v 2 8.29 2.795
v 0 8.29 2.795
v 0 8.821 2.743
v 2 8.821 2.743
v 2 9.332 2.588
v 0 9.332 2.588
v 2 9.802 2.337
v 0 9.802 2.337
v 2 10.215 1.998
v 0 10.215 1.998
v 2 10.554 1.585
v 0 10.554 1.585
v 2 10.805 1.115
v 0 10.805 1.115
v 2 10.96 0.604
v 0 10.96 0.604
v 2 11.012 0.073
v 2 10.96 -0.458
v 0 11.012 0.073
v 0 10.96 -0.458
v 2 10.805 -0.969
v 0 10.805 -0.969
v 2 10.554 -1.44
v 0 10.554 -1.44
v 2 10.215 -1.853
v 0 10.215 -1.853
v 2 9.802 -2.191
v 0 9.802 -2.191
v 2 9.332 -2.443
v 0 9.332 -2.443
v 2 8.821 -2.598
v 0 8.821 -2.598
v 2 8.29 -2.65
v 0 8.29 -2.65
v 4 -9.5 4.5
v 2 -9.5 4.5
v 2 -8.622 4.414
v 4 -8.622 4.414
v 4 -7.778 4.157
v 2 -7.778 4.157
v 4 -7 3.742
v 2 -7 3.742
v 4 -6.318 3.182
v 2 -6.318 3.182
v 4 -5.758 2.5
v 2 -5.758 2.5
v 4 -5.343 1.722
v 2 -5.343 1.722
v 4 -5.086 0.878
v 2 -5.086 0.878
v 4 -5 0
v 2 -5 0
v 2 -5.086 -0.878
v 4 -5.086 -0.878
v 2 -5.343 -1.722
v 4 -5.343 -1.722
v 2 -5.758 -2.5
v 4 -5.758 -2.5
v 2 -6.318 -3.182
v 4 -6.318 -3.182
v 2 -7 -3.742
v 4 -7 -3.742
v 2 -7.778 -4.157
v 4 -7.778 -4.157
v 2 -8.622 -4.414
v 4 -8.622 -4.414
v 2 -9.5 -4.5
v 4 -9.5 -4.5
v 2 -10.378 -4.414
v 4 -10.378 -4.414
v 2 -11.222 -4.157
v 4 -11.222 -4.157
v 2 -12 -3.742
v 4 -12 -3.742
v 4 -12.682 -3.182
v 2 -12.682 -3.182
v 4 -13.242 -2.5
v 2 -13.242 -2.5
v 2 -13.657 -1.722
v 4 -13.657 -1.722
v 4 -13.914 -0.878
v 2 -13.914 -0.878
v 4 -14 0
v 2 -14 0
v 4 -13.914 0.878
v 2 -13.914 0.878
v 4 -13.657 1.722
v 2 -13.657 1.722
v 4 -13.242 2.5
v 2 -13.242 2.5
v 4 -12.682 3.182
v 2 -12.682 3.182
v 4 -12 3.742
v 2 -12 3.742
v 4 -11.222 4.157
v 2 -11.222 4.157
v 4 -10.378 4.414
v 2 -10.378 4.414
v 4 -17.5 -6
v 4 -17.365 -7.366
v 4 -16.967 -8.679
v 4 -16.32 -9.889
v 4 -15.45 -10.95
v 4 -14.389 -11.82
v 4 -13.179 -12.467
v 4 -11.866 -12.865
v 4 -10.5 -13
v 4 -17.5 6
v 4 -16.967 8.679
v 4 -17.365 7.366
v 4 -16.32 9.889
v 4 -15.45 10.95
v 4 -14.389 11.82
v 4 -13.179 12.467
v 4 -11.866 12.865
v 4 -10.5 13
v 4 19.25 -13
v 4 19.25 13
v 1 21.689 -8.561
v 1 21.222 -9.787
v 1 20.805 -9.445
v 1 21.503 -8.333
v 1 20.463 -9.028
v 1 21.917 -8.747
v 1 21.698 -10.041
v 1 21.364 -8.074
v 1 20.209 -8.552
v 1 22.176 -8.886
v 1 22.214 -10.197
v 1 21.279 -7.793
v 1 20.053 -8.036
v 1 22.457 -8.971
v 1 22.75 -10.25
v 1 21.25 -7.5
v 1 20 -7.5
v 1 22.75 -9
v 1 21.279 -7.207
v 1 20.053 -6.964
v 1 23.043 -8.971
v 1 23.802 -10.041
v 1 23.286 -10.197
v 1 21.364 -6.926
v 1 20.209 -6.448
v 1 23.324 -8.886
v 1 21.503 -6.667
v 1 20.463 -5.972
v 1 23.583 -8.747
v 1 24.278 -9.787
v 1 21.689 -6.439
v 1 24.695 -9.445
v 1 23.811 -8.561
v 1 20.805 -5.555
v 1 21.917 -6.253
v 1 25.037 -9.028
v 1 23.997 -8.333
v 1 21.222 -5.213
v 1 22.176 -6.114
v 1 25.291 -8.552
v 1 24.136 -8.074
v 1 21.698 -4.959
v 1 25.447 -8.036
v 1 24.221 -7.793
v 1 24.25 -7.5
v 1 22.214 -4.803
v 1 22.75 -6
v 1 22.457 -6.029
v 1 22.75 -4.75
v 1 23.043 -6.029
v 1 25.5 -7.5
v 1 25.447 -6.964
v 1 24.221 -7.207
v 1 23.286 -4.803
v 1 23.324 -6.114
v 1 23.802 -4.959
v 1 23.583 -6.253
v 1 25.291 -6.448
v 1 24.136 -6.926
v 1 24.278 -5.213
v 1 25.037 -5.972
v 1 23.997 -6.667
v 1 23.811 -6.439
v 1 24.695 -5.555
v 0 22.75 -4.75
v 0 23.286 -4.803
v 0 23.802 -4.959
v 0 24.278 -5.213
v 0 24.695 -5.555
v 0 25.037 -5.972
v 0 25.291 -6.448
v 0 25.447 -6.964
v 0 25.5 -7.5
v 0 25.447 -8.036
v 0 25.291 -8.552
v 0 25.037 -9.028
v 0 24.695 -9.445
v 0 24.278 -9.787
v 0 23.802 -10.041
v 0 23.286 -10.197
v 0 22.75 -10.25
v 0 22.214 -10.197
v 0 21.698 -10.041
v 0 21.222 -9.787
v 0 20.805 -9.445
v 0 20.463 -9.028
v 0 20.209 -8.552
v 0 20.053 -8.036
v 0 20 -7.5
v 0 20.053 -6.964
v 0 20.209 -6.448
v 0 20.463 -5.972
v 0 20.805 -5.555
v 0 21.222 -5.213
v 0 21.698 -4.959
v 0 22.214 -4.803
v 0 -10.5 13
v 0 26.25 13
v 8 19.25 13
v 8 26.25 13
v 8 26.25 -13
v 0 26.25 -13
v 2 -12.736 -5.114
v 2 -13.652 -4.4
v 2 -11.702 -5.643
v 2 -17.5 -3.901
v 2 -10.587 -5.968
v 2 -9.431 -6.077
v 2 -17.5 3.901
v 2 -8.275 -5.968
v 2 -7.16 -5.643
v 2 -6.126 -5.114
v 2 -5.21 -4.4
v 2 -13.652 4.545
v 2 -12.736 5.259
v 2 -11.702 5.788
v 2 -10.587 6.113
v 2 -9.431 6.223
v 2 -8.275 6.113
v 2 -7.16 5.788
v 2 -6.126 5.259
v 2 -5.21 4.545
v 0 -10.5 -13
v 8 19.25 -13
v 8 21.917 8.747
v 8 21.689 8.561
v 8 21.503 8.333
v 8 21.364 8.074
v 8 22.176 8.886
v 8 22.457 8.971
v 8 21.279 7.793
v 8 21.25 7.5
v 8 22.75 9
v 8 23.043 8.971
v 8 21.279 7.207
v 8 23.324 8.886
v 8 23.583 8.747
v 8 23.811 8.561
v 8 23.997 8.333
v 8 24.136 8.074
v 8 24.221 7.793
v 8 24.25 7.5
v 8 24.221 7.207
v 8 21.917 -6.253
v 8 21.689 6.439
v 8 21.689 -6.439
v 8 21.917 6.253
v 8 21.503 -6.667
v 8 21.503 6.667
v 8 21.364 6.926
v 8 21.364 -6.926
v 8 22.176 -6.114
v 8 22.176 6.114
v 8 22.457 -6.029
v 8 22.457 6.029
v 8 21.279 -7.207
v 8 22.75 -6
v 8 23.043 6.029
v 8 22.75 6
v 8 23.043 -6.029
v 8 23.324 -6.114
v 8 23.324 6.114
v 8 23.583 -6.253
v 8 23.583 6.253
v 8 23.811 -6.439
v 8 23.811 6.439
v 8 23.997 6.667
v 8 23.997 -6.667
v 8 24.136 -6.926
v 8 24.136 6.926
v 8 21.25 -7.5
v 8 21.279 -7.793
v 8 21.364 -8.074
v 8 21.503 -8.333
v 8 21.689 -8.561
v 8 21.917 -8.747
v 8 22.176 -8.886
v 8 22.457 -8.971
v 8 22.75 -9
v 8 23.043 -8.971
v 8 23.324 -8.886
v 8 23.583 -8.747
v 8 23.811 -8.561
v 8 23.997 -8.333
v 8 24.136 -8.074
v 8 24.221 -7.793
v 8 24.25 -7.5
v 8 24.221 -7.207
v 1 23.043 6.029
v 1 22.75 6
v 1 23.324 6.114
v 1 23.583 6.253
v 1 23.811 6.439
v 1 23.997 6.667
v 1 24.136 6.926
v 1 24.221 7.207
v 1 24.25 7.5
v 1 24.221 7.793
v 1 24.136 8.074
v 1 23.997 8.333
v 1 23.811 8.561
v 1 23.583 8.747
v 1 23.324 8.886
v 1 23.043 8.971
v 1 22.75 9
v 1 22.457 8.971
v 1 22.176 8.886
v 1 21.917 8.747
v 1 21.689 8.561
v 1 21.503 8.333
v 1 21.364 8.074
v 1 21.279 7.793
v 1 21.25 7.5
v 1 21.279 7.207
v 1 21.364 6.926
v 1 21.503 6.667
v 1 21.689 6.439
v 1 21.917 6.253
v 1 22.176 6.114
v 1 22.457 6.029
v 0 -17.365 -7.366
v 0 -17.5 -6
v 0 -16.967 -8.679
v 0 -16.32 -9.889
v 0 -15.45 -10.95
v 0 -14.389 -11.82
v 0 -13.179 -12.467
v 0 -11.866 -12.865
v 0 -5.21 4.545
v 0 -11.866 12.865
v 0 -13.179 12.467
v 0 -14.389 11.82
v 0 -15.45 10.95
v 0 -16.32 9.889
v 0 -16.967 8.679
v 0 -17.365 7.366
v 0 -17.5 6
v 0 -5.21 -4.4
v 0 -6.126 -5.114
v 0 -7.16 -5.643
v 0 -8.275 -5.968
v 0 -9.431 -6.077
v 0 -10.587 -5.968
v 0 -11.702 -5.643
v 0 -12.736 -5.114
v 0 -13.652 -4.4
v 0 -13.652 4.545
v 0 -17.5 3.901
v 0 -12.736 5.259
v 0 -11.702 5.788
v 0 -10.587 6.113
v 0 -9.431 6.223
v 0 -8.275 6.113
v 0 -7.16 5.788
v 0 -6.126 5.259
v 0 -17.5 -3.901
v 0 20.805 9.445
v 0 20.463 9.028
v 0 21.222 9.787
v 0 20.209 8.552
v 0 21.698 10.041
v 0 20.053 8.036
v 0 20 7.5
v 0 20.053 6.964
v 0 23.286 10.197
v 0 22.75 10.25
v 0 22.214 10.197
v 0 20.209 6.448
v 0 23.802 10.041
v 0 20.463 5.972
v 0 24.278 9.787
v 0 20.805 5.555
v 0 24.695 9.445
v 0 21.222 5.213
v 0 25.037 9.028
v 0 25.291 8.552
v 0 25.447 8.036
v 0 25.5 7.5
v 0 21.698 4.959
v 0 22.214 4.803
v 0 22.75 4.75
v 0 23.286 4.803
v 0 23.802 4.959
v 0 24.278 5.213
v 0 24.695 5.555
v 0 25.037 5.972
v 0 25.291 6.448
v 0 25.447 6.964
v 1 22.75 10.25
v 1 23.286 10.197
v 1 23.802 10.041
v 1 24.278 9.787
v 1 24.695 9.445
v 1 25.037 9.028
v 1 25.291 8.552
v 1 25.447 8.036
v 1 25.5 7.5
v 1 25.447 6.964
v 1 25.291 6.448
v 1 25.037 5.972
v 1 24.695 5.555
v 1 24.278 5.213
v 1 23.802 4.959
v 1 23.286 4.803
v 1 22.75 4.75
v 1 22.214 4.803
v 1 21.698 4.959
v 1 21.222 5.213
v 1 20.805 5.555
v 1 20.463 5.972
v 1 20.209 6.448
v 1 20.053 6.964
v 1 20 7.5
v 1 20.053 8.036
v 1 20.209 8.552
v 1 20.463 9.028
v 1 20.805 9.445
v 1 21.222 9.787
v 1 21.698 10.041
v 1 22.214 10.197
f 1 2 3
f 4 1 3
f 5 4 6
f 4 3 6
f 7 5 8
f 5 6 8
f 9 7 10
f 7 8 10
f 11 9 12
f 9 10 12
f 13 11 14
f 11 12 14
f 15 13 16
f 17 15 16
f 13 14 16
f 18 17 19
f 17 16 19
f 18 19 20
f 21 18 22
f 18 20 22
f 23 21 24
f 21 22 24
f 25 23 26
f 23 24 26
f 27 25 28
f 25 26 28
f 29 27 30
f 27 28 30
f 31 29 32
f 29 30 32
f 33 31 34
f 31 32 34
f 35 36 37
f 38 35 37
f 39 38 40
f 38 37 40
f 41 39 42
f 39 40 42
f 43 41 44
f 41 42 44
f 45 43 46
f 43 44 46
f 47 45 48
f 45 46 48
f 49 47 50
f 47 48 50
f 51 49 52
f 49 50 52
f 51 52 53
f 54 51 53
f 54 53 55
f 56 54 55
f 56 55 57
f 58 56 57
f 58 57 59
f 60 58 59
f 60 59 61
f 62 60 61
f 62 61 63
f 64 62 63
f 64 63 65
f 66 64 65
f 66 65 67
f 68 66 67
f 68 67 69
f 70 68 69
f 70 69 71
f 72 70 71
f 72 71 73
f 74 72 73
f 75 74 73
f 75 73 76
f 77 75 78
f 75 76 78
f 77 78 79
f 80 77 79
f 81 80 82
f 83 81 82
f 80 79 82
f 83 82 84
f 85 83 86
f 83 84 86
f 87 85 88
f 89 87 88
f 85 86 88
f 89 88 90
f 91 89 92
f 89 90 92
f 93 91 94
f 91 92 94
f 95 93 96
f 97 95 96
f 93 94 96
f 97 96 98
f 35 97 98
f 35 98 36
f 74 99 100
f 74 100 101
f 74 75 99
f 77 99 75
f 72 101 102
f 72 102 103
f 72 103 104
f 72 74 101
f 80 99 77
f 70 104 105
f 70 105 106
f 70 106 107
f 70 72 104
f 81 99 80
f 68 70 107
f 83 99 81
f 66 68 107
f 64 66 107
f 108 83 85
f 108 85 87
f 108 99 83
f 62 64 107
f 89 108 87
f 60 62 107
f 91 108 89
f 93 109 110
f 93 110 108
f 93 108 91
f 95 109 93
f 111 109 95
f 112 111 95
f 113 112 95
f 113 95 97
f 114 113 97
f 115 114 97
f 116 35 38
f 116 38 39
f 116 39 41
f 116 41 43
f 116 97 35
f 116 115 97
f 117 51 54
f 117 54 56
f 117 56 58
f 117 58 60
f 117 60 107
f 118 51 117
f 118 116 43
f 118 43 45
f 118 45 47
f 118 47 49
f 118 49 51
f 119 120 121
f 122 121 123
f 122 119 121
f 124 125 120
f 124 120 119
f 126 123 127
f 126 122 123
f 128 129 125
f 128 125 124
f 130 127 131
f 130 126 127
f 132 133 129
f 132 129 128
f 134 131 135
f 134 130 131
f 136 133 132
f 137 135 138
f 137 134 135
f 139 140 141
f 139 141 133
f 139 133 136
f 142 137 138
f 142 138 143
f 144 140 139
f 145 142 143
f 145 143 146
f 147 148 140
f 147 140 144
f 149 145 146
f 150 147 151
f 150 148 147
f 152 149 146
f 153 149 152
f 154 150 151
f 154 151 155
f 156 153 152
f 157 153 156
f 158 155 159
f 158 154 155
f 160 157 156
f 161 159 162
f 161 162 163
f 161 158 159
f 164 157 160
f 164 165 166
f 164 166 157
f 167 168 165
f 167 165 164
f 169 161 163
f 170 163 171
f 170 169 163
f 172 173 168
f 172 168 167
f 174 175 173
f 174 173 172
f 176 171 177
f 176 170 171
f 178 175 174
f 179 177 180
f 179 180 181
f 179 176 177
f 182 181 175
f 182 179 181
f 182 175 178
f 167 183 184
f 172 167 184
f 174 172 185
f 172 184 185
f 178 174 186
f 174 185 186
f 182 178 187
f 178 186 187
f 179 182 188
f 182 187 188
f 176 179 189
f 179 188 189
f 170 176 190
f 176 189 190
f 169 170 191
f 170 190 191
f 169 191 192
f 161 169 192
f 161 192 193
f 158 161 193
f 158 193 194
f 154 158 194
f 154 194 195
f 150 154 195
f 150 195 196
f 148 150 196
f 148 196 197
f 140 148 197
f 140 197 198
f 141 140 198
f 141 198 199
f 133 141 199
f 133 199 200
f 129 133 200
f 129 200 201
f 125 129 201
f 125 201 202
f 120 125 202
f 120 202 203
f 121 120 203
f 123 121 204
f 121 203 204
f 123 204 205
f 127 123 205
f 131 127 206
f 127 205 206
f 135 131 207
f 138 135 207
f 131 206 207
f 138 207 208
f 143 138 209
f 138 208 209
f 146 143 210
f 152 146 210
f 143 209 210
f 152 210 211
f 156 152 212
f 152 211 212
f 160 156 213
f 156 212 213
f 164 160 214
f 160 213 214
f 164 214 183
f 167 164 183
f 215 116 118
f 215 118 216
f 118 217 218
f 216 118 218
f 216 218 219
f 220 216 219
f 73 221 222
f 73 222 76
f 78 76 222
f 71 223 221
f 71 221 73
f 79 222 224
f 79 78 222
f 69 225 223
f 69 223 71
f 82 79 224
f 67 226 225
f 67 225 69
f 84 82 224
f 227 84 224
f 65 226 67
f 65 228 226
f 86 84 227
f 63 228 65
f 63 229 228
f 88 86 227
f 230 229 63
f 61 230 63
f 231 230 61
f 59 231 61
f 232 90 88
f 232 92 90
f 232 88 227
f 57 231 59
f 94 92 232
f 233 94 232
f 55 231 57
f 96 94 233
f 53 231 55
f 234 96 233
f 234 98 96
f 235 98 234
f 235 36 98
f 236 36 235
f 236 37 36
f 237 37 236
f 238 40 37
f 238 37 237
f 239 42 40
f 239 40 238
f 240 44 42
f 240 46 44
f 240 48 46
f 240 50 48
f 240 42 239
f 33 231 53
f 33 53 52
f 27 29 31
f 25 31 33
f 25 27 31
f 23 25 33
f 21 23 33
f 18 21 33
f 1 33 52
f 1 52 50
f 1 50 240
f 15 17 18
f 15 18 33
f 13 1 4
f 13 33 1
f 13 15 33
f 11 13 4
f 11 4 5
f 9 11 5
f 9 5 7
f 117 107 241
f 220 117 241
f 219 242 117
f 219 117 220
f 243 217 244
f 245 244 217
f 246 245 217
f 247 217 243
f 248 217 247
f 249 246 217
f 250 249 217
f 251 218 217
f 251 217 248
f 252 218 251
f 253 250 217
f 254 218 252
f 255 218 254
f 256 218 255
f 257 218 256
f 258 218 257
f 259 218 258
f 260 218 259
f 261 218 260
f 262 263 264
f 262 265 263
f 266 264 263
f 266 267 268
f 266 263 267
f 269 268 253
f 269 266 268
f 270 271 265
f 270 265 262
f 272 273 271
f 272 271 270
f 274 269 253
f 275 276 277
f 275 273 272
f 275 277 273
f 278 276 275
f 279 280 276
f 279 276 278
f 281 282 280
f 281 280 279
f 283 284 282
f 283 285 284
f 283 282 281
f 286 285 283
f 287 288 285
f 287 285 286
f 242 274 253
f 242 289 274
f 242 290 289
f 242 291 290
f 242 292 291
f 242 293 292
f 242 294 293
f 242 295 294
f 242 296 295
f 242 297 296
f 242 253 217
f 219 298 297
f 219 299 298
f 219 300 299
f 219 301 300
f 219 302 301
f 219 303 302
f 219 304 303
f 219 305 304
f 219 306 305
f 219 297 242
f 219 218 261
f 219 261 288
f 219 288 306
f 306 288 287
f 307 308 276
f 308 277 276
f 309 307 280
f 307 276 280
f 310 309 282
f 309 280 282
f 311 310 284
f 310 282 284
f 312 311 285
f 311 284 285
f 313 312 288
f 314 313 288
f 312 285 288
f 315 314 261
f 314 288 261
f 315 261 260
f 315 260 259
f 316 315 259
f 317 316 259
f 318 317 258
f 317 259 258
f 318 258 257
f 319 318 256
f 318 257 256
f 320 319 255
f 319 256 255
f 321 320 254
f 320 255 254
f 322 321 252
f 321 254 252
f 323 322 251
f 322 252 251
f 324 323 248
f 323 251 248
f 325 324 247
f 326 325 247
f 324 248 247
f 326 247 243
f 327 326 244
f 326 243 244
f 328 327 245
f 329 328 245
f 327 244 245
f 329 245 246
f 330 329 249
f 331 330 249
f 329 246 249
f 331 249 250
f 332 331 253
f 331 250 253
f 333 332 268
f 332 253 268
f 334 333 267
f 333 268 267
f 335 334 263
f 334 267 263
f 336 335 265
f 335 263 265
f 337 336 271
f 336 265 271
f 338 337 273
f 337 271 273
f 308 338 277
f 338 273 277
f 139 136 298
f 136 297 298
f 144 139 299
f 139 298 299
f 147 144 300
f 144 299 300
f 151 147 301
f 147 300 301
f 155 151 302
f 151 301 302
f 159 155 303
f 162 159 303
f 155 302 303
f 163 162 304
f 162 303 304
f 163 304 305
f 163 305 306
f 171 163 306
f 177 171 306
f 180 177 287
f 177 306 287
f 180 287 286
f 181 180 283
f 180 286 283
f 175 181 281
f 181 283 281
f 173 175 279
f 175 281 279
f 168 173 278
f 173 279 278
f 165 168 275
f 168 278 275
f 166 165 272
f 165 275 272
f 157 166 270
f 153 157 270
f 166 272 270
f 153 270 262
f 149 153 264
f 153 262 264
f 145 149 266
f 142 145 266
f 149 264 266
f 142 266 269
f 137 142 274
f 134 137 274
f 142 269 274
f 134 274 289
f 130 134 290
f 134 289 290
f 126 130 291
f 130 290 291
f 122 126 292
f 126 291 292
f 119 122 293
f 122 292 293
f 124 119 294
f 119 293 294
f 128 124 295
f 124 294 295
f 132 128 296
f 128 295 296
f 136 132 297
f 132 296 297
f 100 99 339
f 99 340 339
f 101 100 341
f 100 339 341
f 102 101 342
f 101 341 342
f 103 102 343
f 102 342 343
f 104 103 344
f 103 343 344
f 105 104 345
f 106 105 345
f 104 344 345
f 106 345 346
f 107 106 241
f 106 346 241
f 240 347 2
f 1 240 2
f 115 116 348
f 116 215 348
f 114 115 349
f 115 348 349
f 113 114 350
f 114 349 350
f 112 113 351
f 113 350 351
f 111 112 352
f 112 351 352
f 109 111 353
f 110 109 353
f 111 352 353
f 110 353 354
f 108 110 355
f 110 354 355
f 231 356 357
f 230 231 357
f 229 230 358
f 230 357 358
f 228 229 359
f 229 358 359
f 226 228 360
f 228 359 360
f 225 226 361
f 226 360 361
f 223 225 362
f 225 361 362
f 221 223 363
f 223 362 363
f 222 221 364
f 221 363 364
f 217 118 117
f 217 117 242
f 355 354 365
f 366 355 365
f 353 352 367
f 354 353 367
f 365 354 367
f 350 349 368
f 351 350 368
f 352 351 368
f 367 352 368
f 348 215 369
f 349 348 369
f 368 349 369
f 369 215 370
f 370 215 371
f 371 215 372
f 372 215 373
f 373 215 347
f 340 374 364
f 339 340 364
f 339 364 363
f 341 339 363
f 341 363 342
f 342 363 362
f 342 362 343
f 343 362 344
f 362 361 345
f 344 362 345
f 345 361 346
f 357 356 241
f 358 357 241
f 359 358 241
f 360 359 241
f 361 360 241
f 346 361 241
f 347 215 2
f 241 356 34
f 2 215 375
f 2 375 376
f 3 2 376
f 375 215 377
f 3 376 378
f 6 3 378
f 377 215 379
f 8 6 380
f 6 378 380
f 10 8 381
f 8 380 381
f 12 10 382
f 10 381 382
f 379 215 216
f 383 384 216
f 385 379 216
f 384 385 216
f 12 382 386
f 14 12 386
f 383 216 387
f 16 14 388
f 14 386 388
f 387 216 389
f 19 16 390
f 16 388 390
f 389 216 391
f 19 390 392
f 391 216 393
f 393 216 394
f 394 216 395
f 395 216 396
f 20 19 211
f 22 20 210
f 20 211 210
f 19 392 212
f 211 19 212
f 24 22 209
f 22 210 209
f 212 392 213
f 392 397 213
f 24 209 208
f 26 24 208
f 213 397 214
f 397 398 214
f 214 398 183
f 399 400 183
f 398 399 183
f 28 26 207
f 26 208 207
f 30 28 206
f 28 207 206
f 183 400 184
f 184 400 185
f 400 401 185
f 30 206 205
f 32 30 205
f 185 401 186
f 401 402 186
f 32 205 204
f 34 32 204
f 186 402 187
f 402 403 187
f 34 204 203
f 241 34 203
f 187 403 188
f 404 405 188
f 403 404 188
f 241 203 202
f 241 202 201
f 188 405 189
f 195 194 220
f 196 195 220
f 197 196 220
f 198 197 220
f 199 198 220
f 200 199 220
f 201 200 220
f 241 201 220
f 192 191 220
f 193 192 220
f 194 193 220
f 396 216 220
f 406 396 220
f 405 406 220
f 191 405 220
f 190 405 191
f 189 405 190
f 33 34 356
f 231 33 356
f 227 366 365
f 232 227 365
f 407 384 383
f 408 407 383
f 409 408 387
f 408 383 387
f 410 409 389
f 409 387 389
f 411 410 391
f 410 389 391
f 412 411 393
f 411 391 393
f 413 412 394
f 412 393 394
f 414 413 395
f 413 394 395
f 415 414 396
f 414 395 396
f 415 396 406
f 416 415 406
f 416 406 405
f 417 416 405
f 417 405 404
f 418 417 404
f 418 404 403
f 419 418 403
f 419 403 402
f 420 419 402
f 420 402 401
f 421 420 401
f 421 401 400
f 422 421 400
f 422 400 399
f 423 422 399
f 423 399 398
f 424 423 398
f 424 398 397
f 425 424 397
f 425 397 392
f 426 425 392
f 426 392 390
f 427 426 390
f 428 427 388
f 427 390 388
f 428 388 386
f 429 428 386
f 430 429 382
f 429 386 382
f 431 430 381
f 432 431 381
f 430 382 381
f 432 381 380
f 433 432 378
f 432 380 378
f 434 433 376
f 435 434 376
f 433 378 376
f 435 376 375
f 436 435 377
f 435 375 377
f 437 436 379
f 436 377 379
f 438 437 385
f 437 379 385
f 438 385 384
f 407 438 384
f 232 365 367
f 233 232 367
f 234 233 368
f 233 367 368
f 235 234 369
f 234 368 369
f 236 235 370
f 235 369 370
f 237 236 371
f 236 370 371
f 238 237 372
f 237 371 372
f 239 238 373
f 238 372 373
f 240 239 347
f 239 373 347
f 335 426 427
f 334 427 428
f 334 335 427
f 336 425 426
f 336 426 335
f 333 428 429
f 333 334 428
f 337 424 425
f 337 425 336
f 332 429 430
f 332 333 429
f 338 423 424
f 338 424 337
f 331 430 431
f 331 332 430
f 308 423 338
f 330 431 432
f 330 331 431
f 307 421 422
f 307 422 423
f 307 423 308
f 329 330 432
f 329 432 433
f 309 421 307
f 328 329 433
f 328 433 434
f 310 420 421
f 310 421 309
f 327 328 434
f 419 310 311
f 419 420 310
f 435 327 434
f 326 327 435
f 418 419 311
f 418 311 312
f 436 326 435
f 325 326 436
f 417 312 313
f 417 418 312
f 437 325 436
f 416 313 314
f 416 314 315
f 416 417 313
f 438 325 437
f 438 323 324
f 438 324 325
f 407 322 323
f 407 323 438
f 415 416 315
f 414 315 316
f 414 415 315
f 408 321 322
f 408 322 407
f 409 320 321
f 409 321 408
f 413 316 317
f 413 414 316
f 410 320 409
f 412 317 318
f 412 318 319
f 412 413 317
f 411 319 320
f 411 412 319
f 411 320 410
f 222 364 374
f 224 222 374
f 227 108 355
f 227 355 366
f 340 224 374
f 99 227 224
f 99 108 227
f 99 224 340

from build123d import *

# Parameters (mm, degrees)
SKETCH_1_W                    = 26
SKETCH_1_H                    = 43.75
EXTRUDE_1_DEPTH               = 8
CUT_EXTRUDE_1_DEPTH           = 2
SKETCH_3_W                    = 4
SKETCH_3_H                    = 36.75
CUT_EXTRUDE_2_DEPTH           = 38.802943007
HOLE_WIZARD_M2_51_D           = 3
HOLE_WIZARD_M2_51_CBORE_D     = 5.5
HOLE_WIZARD_M2_51_CBORE_DEPTH = 1
HOLE_WIZARD_9_0_9_1_D         = 9
HOLE_WIZARD_9_0_9_1_DEPTH     = 4
FILLET_1_R                    = 7


with BuildPart() as part:
    # Эскиз1 → Бобышка-Вытянуть1 (new body)
    with BuildSketch(Plane(origin=(8, 0, 0), x_dir=(0, 0, -1), z_dir=(1, 0, 0))):
        with Locations((0, 4.375)):
            Rectangle(SKETCH_1_W, SKETCH_1_H)
    extrude(amount=-EXTRUDE_1_DEPTH)

    # Эскиз2 → Вырез-Вытянуть1 (cut)
    with BuildSketch(Plane.ZY):
        with BuildLine():
            Line((3.901238196, -17.5), (4.545454545, -13.652408939))
            ThreePointArc((4.545454545, -13.652408939), (6.222727273, -9.431365141), (4.545454545, -5.210321344))
            Line((4.545454545, -5.210321344), (2.795454545, 8.289678656))
            ThreePointArc((2.795454545, 8.289678656), (0.072727273, 11.012405929), (-2.65, 8.289678656))
            Line((-2.65, 8.289678656), (-4.4, -5.210321344))
            ThreePointArc((-4.4, -5.210321344), (-6.077272727, -9.431365141), (-4.4, -13.652408939))
            Line((-4.4, -13.652408939), (-3.901238196, -17.5))
            Line((-3.901238196, -17.5), (3.901238196, -17.5))
        make_face()
    extrude(amount=-CUT_EXTRUDE_1_DEPTH, mode=Mode.SUBTRACT)

    # Эскиз3 → Вырез-Вытянуть2 (cut, through all)
    with BuildSketch(Plane.XY.offset(13)):
        with Locations((6, 0.875)):
            Rectangle(SKETCH_3_W, SKETCH_3_H)
    extrude(amount=-CUT_EXTRUDE_2_DEPTH, mode=Mode.SUBTRACT)

    # Цековка для винта с заклепочной головкой M2.51 (through all)
    with Locations(Plane.ZY):
        with Locations((-7.5, 22.75), (7.5, 22.75)):
            CounterBoreHole(HOLE_WIZARD_M2_51_D / 2, HOLE_WIZARD_M2_51_CBORE_D / 2, HOLE_WIZARD_M2_51_CBORE_DEPTH)

    # Диаметр отверстия Ø9.0 (9)1
    with Locations(Plane(origin=(4, 0, 0), x_dir=(0, 0, -1), z_dir=(1, 0, 0))):
        with Locations((0, -9.5)):
            Hole(HOLE_WIZARD_9_0_9_1_D / 2, depth=HOLE_WIZARD_9_0_9_1_DEPTH)

    # Скругление1
    fillet_1_edges = [part.edges().sort_by_distance(p)[0] for p in [
        (2, -17.5, -13),
        (2, -17.5, 13),
    ]]
    fillet(fillet_1_edges, radius=FILLET_1_R)


solid = part.part
